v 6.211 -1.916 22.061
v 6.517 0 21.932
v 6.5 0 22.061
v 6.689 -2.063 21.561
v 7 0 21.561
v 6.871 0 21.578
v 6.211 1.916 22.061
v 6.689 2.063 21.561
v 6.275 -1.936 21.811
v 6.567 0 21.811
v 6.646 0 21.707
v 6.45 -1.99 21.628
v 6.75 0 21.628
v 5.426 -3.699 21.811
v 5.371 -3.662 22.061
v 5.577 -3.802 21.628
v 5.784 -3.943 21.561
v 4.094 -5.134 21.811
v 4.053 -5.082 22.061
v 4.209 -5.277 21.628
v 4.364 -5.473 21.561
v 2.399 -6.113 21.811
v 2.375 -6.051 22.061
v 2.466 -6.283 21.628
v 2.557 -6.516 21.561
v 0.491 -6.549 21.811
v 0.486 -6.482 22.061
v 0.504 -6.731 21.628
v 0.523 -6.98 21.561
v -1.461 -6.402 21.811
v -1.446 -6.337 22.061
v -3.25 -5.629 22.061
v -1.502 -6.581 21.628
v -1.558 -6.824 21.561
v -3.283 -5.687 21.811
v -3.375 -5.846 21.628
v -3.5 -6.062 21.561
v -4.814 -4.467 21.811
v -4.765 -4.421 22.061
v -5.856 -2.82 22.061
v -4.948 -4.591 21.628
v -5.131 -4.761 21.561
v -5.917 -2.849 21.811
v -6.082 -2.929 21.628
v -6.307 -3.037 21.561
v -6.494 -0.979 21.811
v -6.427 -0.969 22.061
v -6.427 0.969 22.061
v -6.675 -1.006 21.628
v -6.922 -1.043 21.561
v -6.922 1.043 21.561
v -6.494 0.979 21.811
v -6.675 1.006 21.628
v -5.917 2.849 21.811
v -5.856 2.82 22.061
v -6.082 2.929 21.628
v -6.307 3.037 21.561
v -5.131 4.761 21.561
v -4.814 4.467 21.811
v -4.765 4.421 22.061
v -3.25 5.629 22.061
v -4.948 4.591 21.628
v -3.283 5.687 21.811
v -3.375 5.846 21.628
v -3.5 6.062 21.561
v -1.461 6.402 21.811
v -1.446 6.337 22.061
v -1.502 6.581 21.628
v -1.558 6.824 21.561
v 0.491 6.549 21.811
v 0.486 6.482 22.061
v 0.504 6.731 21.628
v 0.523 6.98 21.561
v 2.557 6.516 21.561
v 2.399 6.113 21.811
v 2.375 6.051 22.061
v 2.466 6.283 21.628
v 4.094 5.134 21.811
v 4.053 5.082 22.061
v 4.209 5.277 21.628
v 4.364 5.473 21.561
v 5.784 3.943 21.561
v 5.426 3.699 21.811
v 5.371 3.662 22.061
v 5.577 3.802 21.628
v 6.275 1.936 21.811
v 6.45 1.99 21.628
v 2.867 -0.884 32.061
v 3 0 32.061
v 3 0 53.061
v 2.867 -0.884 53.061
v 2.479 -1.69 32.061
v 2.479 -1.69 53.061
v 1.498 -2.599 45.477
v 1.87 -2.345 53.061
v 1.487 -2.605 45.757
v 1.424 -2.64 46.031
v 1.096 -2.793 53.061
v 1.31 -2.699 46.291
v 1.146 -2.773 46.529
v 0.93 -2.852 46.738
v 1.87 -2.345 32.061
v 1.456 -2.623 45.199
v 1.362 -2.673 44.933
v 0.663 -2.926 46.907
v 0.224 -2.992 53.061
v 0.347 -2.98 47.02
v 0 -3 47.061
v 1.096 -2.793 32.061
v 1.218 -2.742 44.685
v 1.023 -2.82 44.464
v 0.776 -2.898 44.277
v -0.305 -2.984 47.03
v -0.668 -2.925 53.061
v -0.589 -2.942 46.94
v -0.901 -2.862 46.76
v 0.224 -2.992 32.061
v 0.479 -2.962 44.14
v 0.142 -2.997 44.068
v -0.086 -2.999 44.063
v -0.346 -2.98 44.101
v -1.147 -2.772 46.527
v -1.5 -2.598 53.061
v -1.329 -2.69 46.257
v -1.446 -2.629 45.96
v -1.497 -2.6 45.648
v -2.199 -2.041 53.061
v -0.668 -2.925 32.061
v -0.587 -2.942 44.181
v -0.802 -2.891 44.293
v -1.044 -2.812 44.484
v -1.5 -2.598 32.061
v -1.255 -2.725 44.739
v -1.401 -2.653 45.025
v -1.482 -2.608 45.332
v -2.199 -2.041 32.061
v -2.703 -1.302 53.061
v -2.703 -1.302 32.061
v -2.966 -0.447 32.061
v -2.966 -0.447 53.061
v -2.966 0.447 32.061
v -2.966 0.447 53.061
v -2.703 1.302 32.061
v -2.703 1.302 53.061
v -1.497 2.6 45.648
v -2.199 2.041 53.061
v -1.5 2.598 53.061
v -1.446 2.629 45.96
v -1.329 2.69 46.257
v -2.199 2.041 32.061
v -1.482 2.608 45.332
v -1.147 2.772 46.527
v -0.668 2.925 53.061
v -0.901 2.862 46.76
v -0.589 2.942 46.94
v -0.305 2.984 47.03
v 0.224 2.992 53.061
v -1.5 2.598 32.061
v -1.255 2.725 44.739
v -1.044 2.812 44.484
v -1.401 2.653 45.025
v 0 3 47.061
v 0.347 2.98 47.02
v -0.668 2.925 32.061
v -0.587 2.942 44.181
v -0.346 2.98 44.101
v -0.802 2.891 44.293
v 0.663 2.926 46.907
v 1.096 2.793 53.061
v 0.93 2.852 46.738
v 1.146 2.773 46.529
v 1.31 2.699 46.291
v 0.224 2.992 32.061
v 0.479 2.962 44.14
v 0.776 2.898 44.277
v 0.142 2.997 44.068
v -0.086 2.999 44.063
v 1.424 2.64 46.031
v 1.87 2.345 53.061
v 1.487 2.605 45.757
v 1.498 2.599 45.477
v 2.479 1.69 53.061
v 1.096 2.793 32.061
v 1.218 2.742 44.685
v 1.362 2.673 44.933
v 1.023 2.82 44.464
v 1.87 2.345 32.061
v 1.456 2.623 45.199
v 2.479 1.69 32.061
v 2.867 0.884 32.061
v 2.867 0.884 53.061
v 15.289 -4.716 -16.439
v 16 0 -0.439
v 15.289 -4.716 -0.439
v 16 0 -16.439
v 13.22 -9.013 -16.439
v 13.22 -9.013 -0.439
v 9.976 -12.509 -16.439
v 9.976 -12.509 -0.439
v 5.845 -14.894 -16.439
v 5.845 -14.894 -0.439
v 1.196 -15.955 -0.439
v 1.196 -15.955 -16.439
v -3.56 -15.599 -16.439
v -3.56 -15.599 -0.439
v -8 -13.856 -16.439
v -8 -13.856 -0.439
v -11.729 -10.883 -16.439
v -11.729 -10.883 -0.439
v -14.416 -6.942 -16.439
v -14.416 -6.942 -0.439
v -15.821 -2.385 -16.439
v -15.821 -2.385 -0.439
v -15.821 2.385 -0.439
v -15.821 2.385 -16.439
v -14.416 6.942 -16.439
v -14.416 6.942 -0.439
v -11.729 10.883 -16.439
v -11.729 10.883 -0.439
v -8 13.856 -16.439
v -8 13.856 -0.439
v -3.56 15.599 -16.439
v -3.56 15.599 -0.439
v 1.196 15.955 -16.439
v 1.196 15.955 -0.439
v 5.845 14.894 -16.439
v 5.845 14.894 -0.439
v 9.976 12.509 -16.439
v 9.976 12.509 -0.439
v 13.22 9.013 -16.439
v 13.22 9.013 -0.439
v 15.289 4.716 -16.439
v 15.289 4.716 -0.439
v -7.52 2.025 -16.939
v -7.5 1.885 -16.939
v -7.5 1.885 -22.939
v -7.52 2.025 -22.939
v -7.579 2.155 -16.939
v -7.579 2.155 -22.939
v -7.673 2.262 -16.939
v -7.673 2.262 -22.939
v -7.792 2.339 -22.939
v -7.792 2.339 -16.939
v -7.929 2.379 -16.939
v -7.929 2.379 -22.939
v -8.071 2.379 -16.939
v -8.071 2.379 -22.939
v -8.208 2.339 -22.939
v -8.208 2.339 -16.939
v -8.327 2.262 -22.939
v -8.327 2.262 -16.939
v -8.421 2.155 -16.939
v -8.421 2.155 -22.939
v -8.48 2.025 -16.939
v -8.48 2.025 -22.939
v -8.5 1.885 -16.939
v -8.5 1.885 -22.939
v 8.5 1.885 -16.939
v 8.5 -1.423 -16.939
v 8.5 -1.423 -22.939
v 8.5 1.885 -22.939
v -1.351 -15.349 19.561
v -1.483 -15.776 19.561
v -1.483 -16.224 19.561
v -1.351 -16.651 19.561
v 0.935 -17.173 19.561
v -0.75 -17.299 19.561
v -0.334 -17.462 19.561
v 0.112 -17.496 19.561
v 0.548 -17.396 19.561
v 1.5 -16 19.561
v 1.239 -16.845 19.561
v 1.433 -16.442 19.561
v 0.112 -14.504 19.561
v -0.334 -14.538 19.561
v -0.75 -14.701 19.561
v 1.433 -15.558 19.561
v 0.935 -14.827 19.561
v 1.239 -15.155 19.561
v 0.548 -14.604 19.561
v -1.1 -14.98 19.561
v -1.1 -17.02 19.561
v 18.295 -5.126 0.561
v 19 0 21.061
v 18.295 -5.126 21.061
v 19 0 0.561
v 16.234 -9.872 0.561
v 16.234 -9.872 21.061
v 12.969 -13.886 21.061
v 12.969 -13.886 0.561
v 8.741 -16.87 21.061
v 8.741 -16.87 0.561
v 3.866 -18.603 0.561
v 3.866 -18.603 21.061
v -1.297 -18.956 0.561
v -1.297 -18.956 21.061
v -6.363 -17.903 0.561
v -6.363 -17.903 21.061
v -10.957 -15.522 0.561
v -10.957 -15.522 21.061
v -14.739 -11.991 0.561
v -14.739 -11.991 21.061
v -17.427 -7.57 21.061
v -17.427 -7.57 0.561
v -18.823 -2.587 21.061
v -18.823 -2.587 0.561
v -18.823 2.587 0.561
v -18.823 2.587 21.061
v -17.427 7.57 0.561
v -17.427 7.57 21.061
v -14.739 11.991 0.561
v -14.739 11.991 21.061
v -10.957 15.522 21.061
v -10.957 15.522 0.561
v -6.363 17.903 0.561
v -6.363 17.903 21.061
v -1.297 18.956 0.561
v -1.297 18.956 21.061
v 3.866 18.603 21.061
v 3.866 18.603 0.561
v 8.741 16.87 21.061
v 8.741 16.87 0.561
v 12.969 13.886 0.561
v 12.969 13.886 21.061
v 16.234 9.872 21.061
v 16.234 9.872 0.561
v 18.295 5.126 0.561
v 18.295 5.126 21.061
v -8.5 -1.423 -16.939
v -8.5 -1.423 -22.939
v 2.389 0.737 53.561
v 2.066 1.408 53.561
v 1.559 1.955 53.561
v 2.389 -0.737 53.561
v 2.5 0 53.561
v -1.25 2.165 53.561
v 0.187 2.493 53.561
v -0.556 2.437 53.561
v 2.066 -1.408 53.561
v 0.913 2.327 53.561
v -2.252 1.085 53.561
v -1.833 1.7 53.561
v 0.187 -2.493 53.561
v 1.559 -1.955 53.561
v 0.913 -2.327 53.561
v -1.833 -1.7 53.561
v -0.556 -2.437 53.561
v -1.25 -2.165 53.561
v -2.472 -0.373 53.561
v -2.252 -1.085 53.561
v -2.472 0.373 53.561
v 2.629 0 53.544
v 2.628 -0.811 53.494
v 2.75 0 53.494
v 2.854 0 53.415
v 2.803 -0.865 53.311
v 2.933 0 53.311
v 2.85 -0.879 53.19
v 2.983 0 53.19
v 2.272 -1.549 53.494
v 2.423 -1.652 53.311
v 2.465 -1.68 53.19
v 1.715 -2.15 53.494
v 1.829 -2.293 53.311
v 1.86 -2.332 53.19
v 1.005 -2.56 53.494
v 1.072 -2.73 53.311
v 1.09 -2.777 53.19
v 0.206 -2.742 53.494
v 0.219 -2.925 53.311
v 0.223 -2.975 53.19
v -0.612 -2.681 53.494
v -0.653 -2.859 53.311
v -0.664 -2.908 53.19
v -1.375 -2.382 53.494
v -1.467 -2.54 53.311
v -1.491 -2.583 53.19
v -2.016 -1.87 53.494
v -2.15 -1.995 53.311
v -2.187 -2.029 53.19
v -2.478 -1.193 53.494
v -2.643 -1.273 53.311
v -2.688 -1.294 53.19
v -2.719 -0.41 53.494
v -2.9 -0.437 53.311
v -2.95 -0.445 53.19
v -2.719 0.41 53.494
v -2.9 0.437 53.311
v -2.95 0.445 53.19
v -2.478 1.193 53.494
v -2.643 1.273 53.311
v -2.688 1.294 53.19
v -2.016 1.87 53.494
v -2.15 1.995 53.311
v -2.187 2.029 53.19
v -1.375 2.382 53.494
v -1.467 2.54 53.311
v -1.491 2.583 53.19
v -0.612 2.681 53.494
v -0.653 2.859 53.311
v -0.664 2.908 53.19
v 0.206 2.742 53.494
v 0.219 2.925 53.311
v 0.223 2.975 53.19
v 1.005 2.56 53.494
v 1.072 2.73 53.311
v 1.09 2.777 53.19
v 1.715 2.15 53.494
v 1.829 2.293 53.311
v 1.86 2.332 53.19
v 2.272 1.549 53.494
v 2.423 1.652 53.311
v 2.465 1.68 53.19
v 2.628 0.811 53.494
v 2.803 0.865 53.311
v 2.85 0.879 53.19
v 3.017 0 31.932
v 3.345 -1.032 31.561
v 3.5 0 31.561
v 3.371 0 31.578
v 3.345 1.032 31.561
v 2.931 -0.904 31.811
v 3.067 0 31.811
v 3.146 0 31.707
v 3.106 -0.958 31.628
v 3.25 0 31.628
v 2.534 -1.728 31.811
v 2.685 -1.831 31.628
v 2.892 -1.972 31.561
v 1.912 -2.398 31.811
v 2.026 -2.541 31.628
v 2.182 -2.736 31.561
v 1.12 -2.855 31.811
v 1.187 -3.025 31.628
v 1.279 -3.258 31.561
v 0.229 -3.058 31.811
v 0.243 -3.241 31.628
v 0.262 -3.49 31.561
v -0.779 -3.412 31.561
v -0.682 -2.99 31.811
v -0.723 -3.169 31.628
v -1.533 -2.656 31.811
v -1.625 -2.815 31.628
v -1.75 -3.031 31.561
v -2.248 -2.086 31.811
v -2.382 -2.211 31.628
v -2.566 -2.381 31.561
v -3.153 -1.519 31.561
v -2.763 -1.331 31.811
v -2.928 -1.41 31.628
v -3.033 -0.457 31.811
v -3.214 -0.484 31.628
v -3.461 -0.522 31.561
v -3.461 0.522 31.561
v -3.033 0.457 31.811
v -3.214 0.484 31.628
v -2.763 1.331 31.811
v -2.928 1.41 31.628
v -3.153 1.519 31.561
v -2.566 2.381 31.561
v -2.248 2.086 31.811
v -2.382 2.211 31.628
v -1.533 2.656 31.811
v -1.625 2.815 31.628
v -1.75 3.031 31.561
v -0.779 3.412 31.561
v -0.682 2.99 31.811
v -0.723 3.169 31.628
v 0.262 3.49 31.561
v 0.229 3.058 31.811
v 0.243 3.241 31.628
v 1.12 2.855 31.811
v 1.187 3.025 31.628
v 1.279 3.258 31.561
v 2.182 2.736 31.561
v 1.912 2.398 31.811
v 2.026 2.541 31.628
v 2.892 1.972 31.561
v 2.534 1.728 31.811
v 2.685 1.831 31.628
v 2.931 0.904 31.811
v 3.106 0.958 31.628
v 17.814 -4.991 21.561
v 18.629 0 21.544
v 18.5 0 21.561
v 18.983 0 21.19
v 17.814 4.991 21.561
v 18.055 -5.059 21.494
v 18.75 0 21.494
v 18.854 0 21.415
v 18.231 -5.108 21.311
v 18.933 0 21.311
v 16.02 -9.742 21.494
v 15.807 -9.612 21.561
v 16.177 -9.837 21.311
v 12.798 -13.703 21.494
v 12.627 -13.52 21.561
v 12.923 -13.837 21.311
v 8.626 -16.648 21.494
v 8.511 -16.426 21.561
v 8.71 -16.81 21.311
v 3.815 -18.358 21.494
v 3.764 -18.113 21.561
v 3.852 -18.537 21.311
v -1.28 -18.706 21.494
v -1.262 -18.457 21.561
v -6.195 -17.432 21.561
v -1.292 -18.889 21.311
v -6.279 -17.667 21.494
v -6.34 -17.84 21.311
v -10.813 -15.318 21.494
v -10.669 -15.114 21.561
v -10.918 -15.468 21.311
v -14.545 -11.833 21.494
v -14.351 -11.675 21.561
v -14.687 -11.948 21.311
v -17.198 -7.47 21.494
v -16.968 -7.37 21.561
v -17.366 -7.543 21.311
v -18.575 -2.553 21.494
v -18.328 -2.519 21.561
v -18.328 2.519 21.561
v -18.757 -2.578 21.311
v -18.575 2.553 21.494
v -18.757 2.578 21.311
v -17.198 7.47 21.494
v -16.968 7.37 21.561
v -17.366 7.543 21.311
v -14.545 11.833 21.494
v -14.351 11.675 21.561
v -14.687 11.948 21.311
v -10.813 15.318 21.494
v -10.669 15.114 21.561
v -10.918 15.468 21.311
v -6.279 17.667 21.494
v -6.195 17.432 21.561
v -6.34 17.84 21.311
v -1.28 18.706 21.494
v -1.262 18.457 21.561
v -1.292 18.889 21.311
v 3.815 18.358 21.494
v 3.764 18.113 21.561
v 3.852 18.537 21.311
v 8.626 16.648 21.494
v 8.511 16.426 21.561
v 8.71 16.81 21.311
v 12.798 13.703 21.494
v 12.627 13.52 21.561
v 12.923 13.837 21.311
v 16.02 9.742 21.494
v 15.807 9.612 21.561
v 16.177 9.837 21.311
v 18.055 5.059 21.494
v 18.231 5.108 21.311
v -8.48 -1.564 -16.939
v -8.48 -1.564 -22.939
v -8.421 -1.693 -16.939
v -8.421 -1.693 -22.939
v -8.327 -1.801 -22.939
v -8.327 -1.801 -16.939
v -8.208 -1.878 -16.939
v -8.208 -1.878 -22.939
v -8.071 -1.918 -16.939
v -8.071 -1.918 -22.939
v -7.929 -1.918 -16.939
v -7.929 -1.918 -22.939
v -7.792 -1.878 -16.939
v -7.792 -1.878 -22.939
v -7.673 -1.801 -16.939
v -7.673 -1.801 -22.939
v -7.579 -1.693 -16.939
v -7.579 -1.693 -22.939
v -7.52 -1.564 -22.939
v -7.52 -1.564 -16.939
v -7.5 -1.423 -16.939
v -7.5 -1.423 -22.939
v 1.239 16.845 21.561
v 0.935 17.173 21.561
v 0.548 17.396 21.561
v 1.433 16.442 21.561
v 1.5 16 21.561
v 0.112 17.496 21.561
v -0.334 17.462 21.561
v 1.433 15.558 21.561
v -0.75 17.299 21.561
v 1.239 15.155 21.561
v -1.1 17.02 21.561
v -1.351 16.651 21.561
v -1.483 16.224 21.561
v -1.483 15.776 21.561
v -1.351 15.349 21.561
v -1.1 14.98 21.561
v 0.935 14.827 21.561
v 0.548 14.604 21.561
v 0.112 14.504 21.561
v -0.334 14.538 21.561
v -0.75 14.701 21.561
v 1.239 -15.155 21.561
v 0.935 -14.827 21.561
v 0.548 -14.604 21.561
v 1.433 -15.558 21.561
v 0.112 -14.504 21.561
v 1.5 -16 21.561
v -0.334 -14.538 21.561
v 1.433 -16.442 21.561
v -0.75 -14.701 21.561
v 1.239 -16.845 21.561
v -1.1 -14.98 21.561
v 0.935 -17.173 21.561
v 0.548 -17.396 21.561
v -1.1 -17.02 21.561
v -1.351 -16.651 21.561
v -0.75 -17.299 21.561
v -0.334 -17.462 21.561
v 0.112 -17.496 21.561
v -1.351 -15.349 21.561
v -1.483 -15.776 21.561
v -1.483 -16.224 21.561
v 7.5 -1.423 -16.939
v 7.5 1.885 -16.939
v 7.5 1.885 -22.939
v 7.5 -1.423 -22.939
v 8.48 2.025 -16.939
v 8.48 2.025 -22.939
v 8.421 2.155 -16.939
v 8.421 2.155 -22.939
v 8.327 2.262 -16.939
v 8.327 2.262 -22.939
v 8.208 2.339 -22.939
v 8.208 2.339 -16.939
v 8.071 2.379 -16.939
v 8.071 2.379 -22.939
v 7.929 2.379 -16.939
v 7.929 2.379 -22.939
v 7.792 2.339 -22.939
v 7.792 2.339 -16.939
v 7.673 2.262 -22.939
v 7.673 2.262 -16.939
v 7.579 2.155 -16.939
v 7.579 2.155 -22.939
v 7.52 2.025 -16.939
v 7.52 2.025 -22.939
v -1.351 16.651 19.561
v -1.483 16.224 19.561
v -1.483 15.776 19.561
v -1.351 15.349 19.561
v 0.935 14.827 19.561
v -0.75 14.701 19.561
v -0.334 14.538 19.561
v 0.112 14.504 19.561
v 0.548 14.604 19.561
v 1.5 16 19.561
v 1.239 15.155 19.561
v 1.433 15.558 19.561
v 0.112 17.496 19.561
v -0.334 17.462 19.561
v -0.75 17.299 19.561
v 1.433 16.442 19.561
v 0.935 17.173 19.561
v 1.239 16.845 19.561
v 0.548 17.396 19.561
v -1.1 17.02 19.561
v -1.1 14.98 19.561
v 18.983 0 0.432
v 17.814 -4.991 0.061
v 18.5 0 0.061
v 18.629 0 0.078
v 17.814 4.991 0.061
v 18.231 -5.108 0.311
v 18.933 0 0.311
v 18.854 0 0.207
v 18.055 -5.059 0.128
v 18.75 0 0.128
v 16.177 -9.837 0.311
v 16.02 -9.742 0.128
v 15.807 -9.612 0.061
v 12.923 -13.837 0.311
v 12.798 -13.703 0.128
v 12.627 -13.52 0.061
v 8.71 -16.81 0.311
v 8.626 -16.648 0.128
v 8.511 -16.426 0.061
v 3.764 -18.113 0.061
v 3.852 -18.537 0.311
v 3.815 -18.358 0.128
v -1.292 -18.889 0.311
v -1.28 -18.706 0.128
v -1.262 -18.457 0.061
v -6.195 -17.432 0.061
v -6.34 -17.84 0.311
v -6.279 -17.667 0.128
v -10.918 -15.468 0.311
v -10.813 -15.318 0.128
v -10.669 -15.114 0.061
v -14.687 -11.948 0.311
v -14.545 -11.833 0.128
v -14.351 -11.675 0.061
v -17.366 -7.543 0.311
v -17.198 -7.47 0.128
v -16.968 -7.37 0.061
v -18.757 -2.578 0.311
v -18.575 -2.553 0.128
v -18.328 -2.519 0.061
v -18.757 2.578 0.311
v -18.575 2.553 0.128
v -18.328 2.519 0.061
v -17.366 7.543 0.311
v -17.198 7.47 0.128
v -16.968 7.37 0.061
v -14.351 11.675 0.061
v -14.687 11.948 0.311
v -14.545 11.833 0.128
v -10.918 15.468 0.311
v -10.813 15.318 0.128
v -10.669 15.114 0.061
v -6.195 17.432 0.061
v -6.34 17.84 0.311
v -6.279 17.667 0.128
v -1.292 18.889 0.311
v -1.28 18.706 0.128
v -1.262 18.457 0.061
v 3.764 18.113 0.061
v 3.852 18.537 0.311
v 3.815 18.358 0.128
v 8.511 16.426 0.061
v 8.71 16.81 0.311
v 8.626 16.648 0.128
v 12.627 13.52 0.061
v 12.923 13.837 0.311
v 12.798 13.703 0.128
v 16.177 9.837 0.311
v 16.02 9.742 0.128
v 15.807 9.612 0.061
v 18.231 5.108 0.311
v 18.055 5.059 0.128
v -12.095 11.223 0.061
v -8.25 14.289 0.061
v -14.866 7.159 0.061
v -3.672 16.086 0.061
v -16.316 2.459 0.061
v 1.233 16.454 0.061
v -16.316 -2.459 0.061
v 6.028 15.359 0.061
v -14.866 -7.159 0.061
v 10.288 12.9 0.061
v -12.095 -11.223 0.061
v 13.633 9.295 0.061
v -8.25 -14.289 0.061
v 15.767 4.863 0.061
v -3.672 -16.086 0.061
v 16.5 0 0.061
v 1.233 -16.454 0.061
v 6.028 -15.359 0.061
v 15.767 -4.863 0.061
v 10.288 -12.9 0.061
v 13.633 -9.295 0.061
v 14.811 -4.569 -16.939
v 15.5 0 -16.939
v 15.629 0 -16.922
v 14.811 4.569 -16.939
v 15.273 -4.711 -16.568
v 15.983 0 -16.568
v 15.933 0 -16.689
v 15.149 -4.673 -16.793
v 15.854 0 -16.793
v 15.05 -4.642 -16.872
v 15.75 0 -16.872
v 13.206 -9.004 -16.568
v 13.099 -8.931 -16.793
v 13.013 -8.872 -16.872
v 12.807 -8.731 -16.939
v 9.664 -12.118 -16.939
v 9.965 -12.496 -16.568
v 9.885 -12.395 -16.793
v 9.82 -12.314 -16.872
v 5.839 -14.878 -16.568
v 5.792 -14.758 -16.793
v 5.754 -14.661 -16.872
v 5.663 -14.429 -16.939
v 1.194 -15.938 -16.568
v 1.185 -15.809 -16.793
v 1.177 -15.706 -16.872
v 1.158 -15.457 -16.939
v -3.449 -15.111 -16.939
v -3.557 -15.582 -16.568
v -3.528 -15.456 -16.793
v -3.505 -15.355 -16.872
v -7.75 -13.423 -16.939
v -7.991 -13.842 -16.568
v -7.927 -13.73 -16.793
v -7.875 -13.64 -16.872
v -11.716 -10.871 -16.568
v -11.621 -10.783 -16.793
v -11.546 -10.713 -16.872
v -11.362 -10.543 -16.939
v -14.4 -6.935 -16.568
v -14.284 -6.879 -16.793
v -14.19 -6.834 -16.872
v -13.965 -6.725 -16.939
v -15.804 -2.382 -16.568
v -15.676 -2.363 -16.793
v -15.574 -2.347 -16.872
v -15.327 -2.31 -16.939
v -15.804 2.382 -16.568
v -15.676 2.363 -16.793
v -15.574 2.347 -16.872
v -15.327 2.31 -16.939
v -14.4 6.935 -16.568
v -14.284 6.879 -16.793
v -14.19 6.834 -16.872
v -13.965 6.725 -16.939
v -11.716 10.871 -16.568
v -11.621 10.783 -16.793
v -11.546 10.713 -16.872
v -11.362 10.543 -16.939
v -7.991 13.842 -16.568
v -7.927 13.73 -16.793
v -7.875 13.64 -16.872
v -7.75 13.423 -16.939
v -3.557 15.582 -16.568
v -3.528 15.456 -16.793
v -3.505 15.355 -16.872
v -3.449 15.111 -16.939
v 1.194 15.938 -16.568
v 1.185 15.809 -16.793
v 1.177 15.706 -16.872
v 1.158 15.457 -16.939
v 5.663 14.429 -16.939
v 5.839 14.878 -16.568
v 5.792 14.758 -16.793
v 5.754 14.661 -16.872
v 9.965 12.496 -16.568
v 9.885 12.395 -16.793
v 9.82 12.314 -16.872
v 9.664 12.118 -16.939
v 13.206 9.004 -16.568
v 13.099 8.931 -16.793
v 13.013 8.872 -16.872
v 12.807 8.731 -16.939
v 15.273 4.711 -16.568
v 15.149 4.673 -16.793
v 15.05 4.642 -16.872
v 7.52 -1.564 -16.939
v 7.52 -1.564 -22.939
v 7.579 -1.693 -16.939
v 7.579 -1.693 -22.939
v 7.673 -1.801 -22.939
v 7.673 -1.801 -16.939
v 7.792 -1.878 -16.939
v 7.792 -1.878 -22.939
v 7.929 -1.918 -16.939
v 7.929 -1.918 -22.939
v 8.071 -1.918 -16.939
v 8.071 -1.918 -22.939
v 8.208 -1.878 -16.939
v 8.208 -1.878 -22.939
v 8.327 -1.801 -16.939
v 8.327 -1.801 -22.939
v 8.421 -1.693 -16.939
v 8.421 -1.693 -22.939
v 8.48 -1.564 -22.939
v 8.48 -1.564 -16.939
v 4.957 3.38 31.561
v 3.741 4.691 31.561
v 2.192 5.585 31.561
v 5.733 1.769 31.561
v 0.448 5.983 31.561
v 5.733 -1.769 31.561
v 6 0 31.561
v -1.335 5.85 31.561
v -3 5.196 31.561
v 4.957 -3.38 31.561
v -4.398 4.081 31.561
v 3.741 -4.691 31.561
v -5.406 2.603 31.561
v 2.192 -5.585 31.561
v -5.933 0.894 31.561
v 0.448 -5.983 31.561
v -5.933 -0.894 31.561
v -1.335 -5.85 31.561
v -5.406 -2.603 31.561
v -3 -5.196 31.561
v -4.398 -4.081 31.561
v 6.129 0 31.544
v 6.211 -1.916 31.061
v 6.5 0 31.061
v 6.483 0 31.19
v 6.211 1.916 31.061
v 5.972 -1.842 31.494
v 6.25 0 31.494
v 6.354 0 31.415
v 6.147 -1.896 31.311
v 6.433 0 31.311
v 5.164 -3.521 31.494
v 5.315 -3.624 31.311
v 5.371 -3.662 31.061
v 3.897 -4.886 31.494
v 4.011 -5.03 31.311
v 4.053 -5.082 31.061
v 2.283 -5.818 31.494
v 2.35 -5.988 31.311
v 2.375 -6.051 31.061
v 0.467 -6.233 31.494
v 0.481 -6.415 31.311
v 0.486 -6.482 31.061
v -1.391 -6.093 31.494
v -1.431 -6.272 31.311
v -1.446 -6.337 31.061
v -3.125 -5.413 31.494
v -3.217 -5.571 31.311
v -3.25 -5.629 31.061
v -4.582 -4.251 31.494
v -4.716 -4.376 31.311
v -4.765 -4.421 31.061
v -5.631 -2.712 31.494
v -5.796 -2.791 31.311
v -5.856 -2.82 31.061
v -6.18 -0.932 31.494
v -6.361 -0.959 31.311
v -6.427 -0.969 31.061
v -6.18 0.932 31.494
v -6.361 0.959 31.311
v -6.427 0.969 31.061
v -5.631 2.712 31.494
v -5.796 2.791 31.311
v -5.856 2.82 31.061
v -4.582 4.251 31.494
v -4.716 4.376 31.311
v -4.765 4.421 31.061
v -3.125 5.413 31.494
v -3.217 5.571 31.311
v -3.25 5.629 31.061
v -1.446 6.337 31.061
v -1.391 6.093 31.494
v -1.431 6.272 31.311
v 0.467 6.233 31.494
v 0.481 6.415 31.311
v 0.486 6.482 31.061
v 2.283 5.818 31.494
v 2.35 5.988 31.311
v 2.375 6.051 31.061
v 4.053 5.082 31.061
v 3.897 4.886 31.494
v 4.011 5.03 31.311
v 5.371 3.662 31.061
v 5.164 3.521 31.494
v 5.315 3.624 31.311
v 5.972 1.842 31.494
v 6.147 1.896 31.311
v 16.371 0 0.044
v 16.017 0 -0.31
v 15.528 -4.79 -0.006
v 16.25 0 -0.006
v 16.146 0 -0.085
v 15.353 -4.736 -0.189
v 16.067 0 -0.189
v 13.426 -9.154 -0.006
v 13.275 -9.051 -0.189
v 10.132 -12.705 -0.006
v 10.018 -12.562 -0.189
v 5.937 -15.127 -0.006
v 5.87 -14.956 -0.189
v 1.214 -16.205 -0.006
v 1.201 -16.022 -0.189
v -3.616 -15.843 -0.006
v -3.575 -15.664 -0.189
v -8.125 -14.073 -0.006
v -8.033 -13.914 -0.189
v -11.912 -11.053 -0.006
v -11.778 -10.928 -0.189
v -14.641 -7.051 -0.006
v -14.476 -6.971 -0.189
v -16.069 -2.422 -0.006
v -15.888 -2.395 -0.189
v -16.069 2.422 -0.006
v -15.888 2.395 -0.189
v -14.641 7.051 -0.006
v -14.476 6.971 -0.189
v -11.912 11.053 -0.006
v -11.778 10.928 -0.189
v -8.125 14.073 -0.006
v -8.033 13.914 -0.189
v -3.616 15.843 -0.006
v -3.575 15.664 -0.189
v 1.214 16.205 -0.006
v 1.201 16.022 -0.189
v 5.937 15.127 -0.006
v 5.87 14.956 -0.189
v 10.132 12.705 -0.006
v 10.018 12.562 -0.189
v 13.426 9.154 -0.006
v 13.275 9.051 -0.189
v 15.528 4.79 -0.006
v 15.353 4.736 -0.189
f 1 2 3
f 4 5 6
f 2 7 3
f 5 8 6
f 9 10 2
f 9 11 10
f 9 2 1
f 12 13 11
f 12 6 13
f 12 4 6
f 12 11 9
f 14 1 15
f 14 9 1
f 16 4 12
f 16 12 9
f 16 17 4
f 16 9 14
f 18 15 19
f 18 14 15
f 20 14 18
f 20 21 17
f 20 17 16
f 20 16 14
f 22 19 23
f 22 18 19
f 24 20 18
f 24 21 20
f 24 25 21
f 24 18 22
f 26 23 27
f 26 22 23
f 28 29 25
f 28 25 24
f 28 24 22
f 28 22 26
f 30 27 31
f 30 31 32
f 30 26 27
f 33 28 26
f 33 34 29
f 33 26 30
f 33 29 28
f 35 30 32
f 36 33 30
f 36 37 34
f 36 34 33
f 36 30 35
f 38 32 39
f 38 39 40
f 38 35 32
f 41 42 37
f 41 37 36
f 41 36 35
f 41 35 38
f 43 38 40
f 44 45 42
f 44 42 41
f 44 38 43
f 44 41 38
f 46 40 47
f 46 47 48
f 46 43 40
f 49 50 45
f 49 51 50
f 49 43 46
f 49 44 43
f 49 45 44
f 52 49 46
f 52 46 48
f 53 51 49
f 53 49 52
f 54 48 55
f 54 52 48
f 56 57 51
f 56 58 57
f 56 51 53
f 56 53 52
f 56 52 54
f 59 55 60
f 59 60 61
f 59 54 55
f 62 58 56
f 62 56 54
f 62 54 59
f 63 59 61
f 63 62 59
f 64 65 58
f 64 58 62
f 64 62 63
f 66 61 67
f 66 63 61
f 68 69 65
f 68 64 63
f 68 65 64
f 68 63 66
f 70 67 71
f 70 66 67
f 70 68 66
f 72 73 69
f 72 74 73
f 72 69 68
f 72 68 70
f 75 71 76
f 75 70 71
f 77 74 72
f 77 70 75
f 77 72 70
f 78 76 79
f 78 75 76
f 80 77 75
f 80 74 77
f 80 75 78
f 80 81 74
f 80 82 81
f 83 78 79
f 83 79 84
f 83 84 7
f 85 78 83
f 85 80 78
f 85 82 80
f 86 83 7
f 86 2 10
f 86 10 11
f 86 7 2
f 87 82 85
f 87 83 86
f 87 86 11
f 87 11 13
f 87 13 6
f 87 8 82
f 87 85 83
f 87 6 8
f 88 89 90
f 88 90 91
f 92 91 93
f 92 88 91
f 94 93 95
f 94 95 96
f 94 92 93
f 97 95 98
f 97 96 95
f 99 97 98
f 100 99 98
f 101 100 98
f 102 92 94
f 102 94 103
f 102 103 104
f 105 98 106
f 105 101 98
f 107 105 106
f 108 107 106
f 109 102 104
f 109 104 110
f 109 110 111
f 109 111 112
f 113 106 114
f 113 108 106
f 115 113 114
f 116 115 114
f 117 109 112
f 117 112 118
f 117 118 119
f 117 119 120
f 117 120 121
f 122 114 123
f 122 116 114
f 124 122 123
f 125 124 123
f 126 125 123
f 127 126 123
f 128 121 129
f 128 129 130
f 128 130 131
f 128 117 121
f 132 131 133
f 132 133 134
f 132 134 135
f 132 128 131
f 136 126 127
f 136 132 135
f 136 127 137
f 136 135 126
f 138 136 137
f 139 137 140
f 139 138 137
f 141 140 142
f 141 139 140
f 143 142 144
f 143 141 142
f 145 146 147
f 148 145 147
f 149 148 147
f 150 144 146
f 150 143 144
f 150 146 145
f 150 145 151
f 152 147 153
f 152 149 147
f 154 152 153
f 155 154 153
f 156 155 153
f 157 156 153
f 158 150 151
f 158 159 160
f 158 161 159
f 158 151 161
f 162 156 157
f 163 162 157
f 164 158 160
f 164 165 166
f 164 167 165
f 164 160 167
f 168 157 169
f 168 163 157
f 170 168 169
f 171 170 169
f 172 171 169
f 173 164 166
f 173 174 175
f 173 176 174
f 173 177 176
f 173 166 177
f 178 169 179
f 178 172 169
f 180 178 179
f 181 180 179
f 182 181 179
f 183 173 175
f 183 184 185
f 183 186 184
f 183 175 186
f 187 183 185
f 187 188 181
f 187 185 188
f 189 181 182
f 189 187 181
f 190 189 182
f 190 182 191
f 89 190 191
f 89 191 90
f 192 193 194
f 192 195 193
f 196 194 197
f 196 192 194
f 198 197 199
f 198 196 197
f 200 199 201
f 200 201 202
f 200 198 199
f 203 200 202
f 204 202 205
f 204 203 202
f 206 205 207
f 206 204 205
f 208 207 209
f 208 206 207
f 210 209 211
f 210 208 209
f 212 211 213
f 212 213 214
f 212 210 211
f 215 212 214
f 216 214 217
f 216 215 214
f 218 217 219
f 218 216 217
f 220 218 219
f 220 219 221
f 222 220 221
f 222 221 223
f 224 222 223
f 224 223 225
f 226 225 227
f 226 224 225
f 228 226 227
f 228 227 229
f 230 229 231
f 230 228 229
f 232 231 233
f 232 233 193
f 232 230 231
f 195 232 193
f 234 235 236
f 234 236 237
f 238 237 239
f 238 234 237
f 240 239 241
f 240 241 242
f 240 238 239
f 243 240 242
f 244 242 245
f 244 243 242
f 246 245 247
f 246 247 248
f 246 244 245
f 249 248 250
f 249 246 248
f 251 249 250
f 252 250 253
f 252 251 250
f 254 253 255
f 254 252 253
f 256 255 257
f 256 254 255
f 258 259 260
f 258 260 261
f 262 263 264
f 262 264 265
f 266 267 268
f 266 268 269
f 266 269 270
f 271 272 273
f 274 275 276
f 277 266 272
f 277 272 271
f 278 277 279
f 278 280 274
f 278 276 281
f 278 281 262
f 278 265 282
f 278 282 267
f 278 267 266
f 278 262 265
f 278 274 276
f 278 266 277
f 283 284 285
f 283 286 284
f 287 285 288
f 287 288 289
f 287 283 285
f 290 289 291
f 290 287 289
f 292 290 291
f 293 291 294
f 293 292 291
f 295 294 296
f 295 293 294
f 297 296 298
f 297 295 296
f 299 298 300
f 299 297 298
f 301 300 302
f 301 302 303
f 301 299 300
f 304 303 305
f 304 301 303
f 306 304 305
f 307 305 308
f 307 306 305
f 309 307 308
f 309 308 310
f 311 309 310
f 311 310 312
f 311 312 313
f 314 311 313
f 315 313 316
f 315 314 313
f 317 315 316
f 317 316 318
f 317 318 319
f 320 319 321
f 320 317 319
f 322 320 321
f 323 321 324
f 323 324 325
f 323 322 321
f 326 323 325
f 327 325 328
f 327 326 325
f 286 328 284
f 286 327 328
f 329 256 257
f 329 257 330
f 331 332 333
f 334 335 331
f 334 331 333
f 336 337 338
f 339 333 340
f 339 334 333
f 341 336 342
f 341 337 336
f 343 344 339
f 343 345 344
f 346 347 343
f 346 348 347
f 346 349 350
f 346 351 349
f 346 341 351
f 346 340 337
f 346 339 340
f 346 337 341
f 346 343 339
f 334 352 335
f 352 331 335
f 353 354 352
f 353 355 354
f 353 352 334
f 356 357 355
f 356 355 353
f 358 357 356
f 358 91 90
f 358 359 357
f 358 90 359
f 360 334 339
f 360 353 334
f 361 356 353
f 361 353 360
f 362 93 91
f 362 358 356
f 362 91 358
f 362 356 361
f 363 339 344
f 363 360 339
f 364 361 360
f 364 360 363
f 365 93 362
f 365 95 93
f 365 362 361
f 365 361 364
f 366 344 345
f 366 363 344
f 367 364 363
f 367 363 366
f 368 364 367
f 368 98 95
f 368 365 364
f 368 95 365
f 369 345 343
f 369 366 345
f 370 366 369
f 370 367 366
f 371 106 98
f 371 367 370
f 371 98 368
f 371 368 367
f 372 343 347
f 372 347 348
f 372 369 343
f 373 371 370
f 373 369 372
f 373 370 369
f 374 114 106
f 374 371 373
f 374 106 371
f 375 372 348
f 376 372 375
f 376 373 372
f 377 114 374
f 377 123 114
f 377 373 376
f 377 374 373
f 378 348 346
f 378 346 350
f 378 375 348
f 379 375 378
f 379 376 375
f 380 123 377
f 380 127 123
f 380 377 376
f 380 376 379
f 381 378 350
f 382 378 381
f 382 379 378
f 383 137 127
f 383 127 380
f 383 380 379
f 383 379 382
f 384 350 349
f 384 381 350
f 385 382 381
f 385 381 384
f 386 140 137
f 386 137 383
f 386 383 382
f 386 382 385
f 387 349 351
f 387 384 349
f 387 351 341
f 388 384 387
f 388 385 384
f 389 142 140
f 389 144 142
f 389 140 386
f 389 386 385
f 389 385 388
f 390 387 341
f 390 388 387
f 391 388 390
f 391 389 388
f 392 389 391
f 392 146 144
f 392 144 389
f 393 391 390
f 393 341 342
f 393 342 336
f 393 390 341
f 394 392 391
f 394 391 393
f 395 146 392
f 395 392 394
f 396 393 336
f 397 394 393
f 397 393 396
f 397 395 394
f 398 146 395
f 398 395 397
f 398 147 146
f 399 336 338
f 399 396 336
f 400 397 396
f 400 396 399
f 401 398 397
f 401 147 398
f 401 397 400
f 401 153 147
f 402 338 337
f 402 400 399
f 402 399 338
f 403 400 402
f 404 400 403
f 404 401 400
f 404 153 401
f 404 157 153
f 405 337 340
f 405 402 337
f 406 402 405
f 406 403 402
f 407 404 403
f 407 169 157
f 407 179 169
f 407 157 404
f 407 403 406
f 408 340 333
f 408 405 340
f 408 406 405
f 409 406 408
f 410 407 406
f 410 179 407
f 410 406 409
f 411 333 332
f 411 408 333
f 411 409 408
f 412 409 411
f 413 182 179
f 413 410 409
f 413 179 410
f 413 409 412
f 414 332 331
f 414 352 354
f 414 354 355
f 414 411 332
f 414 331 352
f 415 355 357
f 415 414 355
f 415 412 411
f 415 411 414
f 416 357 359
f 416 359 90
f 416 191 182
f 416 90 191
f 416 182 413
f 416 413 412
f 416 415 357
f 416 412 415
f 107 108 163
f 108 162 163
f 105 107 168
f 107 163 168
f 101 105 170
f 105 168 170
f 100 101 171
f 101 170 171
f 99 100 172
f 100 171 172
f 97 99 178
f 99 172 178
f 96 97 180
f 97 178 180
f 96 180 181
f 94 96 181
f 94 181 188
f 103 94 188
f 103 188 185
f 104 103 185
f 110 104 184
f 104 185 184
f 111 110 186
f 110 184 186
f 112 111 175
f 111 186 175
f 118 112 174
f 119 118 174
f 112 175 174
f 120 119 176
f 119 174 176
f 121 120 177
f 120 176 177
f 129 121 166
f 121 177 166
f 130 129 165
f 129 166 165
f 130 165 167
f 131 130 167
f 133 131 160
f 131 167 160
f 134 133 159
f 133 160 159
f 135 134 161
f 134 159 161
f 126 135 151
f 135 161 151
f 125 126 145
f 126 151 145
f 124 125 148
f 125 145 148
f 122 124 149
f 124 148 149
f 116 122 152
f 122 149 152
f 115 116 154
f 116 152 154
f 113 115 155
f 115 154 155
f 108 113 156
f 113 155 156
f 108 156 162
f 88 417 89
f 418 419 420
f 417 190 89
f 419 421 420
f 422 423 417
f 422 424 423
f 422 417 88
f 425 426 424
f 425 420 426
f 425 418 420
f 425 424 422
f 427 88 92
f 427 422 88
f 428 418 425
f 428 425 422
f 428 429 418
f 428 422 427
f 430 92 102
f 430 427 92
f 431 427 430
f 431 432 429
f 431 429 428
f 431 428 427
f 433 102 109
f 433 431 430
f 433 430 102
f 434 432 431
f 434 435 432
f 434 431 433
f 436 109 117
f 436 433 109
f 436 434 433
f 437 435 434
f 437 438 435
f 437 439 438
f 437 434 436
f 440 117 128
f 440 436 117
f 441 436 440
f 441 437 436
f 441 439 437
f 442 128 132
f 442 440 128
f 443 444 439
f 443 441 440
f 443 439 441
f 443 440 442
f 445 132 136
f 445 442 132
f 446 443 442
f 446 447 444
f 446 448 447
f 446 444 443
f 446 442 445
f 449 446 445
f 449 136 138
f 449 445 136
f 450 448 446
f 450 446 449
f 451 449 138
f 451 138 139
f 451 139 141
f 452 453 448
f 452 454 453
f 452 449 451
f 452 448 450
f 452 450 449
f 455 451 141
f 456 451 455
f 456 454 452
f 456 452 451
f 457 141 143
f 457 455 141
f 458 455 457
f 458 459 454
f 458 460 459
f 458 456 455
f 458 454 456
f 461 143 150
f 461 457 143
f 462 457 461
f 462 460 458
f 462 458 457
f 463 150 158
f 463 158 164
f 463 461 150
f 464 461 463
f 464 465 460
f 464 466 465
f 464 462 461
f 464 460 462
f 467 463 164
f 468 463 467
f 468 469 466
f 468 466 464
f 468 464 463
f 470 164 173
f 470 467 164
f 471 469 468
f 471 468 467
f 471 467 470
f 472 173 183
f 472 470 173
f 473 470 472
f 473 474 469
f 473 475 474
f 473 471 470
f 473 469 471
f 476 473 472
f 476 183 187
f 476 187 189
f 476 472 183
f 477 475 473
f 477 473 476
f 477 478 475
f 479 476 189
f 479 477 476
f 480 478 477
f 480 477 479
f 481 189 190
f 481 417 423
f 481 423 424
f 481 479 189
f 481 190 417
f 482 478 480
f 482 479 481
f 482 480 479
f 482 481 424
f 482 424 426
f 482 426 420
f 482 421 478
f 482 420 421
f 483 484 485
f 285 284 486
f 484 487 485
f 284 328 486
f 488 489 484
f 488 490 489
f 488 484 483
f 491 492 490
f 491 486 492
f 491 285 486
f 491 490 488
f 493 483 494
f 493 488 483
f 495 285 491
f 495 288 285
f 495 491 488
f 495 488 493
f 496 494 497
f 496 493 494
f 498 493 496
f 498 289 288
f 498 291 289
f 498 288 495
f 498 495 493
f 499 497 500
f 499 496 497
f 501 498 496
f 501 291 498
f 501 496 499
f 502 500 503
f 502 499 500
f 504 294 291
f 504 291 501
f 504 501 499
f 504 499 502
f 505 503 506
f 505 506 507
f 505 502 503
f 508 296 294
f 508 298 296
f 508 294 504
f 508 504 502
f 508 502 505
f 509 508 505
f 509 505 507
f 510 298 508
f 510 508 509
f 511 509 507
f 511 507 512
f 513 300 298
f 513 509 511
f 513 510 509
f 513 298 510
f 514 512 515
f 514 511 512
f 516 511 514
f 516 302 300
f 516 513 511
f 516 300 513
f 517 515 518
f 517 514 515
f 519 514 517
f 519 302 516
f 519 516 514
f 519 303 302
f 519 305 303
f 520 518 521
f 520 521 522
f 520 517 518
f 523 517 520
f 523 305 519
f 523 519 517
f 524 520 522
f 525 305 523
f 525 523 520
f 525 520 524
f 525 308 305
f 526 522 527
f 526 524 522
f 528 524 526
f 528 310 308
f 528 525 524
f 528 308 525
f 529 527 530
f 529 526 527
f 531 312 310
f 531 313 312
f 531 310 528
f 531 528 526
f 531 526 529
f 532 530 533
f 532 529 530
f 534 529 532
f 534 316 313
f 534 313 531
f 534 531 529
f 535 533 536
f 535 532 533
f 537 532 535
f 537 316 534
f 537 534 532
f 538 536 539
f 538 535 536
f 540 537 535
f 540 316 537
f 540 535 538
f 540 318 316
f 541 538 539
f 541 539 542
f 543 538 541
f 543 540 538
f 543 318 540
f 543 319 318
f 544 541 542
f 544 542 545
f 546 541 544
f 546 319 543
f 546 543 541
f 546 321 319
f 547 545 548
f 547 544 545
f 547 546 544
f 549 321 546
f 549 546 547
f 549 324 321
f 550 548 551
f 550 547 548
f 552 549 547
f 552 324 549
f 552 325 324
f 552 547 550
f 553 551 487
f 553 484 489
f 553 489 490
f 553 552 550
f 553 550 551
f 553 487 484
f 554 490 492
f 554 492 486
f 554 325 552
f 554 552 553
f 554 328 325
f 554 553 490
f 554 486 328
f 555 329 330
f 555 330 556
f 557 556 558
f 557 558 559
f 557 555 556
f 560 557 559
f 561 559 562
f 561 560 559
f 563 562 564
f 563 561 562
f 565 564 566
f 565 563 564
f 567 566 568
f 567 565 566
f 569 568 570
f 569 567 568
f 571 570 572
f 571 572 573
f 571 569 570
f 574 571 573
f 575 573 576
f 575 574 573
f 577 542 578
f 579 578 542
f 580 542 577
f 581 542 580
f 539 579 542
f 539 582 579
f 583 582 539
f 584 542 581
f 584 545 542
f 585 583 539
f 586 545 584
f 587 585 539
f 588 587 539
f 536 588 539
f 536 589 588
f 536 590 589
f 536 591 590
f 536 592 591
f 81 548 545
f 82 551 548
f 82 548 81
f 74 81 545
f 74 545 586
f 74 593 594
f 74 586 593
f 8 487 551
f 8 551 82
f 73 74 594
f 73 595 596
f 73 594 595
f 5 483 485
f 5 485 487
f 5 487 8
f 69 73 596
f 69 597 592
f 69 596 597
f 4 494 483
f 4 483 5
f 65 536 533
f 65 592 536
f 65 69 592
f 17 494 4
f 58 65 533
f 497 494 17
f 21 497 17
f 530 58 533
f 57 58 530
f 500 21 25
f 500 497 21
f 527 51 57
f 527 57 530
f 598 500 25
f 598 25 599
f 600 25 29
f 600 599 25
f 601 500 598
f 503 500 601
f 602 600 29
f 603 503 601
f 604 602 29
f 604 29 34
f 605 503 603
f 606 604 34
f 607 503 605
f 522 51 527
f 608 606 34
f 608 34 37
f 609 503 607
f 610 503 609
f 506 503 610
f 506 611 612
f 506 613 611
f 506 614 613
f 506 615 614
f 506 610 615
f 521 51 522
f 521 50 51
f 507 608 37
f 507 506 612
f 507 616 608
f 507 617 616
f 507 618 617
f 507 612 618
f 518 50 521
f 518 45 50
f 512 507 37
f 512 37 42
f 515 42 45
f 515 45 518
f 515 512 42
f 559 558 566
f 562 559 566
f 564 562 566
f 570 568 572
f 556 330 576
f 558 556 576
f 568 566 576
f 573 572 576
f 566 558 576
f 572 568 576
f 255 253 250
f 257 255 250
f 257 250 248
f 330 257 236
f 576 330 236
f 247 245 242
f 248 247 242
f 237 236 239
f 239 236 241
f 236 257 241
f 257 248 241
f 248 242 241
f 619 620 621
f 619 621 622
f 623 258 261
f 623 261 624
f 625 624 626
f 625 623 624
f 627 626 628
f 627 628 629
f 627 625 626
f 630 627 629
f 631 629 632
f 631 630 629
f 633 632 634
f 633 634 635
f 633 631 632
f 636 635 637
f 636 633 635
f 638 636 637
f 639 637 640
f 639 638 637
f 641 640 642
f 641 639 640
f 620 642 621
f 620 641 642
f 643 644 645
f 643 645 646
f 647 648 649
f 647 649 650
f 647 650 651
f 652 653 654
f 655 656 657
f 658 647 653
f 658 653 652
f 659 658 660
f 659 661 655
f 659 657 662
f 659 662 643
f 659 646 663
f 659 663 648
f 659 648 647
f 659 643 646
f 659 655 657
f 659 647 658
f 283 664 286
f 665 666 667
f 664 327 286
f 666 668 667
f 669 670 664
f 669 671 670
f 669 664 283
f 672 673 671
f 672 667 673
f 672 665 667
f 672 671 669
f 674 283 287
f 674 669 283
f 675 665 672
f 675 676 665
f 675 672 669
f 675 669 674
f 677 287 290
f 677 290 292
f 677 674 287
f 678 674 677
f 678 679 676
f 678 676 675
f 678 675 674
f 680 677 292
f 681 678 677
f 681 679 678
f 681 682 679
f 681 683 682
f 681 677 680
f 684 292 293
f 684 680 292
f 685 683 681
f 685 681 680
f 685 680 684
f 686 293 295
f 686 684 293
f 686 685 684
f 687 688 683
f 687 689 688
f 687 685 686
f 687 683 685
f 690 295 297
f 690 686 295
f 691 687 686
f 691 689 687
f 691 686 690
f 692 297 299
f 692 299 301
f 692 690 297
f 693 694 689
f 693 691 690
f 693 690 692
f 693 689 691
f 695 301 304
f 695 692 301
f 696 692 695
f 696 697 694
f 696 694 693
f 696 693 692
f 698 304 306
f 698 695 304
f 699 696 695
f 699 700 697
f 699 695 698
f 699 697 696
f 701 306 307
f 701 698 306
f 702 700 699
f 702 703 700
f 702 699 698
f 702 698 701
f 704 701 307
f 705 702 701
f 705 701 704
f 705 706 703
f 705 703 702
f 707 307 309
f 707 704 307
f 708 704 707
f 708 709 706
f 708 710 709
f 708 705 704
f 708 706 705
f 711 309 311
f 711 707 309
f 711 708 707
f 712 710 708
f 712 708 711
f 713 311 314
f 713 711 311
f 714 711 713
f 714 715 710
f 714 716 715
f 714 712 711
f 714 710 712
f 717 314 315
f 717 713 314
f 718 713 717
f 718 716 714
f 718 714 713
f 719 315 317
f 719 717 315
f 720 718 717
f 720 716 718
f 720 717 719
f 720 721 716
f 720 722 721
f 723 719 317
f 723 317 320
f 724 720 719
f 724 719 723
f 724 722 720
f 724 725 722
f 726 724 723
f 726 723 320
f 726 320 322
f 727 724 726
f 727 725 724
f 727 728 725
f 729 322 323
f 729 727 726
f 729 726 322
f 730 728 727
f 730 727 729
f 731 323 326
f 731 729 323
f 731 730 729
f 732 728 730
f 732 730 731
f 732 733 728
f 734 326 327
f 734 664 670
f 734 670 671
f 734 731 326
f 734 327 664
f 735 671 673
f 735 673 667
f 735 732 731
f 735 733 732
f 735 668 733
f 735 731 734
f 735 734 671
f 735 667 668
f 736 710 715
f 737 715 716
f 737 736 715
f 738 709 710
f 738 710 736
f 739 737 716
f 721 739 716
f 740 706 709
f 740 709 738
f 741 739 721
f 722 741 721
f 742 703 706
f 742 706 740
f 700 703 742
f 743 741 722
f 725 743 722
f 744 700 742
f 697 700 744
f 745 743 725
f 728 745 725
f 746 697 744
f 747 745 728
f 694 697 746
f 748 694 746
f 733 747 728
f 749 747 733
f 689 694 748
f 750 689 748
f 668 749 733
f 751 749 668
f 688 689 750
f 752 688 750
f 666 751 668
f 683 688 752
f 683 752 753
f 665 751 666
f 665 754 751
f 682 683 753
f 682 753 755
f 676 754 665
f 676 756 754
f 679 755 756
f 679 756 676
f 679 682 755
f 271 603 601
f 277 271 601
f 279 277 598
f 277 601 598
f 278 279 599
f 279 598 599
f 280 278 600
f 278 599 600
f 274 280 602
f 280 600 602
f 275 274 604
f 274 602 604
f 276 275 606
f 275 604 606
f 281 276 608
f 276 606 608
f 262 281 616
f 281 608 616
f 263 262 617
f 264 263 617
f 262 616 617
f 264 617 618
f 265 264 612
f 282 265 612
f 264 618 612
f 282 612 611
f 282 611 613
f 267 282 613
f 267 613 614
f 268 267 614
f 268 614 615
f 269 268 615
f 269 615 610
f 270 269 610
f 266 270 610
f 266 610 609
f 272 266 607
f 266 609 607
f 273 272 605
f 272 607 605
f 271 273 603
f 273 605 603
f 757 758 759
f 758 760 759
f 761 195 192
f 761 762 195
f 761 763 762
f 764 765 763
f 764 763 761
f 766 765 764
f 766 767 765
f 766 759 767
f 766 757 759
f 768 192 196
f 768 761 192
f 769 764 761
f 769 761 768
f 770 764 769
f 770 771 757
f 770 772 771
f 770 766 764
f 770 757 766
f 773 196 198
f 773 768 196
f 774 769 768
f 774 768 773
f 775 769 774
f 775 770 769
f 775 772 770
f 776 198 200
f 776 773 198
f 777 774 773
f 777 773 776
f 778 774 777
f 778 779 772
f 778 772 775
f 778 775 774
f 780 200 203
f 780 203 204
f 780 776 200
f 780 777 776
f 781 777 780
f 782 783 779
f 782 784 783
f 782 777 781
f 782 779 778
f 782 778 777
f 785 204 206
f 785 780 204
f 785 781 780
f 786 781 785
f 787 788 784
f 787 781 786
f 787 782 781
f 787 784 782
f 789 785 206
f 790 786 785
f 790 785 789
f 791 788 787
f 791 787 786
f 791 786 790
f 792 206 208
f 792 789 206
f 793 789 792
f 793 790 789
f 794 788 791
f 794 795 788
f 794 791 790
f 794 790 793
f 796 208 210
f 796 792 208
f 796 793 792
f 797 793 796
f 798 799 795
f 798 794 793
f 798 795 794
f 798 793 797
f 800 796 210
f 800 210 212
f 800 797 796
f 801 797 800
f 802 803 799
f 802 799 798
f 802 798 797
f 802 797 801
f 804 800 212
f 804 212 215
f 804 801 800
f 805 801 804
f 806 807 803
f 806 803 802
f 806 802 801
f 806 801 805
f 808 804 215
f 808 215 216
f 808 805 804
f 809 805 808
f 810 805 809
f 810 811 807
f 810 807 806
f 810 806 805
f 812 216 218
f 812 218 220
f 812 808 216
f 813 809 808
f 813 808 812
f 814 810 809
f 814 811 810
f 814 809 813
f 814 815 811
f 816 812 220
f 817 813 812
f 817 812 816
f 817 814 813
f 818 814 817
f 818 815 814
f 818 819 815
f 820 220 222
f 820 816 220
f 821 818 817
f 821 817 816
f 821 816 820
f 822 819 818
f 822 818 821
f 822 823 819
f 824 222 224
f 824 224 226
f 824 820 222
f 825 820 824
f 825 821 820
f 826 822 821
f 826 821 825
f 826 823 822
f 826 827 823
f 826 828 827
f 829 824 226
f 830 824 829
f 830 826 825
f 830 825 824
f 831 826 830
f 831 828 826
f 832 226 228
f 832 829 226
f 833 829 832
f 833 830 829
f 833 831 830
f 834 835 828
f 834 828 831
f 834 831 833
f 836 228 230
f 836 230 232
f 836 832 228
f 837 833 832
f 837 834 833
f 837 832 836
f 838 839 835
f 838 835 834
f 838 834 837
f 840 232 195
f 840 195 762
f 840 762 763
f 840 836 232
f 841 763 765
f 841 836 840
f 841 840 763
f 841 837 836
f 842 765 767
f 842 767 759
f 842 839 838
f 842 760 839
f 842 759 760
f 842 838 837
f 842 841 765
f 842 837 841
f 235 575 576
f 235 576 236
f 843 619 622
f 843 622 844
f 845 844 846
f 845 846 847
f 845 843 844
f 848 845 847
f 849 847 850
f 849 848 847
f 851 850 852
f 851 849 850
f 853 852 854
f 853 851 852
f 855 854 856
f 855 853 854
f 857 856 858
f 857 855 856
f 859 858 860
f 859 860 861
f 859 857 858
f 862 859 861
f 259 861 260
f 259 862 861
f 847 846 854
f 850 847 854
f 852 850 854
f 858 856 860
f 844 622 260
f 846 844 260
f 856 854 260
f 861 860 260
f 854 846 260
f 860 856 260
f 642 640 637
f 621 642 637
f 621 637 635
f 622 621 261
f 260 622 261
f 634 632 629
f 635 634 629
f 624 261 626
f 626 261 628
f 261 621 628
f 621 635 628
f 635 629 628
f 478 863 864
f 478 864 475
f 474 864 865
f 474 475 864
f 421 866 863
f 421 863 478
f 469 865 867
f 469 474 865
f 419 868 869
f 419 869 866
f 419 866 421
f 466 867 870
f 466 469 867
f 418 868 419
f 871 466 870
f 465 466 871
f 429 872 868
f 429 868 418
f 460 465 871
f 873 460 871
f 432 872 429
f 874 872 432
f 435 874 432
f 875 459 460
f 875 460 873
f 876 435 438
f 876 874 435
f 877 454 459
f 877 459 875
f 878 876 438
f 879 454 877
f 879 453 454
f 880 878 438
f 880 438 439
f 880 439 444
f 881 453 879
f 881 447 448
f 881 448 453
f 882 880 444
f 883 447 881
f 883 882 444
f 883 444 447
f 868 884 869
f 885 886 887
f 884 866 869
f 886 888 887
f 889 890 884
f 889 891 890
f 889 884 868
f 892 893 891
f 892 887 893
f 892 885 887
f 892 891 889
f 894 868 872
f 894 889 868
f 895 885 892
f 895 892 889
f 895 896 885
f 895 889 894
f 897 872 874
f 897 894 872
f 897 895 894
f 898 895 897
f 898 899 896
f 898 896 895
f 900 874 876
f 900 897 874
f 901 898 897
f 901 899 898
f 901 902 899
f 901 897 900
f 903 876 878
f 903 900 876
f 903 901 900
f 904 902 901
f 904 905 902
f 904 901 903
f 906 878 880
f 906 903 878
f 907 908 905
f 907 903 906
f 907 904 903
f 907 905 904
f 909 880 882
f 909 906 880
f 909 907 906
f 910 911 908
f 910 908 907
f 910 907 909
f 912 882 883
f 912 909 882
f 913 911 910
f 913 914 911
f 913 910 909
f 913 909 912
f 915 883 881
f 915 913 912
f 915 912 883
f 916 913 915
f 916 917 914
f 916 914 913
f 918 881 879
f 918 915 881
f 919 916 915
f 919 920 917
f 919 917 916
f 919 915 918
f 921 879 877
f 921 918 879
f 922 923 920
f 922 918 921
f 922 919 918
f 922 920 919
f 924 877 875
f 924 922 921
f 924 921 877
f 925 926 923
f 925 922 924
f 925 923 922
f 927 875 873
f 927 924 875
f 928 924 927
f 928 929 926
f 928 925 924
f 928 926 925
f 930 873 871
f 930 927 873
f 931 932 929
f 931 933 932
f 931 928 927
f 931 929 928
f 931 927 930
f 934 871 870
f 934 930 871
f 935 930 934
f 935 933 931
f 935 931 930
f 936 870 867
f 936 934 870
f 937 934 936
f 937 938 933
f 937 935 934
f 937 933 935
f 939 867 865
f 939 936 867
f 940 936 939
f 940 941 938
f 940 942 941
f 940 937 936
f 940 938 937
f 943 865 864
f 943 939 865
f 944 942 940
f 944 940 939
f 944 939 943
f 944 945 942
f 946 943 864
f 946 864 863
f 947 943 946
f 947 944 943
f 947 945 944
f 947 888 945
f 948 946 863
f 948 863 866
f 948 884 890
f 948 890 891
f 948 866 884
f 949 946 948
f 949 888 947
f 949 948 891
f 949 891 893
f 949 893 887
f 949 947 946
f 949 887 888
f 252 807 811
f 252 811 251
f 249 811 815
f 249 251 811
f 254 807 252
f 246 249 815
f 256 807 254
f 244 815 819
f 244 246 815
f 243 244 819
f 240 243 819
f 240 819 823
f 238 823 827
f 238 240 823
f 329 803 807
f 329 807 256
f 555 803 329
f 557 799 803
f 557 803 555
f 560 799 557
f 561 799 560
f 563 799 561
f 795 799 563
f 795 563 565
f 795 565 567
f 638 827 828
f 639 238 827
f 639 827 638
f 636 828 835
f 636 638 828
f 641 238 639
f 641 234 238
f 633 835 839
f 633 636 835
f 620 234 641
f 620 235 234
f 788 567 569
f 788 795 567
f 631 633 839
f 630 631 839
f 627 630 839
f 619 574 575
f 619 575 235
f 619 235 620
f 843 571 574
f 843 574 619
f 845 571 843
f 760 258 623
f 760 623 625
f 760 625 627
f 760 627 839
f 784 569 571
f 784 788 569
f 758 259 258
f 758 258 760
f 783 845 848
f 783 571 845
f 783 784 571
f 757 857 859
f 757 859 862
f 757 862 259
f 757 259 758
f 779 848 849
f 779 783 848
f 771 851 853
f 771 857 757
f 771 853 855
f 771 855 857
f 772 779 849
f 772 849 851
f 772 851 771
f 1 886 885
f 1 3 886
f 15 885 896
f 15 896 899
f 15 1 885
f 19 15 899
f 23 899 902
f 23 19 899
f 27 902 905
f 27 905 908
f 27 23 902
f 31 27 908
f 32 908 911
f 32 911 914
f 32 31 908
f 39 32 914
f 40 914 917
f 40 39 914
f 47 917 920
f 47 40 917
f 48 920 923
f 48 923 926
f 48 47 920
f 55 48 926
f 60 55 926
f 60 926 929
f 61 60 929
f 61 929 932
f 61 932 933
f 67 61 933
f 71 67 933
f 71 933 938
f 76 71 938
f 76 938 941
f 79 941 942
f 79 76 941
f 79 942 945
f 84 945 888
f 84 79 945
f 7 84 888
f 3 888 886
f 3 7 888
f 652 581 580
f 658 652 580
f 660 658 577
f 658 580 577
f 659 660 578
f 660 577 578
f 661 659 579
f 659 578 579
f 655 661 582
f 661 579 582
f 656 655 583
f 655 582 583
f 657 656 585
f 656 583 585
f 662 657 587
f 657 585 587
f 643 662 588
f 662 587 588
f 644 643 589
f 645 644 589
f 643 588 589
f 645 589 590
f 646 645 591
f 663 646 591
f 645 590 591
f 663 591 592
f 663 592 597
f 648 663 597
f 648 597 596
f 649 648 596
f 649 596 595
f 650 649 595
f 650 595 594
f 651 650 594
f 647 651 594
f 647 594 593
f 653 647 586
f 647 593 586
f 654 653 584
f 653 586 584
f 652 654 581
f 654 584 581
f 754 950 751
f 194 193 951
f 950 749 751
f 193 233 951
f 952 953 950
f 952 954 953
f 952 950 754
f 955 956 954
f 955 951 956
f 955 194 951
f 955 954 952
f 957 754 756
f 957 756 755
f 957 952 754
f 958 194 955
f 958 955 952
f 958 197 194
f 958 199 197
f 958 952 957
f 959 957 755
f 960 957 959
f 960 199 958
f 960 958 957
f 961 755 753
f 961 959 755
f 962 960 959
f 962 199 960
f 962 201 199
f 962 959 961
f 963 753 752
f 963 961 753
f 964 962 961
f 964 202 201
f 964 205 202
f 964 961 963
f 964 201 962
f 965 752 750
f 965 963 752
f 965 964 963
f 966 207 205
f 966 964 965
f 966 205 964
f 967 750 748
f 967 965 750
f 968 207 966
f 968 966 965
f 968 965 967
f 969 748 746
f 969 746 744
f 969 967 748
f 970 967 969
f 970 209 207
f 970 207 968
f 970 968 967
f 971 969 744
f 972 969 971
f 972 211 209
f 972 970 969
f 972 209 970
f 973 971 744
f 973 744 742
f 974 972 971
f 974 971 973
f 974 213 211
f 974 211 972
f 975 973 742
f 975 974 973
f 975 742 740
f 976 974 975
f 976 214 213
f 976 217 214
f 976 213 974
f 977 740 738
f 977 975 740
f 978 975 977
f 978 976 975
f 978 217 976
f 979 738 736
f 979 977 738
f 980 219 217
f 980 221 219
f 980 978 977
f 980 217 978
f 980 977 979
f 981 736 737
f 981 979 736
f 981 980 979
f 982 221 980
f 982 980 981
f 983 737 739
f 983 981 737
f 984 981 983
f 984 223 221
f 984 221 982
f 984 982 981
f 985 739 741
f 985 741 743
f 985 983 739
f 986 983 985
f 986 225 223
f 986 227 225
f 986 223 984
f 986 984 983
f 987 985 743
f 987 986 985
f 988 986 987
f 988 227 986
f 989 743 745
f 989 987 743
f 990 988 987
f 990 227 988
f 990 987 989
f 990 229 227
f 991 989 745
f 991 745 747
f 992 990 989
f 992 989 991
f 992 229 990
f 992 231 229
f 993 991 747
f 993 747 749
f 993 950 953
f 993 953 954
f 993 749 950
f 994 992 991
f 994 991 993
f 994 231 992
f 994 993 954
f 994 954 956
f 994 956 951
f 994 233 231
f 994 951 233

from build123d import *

# Parameters (mm, degrees)
SKETCH3_R           = 1.5
CUT_EXTRUDE1_DEPTH  = 5
BOSS_EXTRUDE1_DEPTH = 6
SKETCH5_R           = 1.5
CUT_EXTRUDE2_DEPTH  = 2


with BuildPart() as part:
    # Sketch2 → Revolve1 (revolve)
    with BuildSketch(Plane(origin=(0, 0, 0), x_dir=(0, 0, -1), z_dir=(1, 0, 0)), mode=Mode.PRIVATE) as revolve1_sk:
        with BuildLine():
            Line((-53.56097561, 0), (-53.56097561, 2.5))
            ThreePointArc((-53.56097561, 2.5), (-53.414529, 2.853553391), (-53.06097561, 3))
            Line((-53.06097561, 3), (-32.06097561, 3))
            ThreePointArc((-32.06097561, 3), (-31.707422219, 3.146446609), (-31.56097561, 3.5))
            Line((-31.56097561, 3.5), (-31.56097561, 6))
            ThreePointArc((-31.56097561, 6), (-31.414529, 6.353553391), (-31.06097561, 6.5))
            Line((-31.06097561, 6.5), (-22.06097561, 6.5))
            ThreePointArc((-22.06097561, 6.5), (-21.707422219, 6.646446609), (-21.56097561, 7))
            Line((-21.56097561, 7), (-21.56097561, 18.5))
            ThreePointArc((-21.56097561, 18.5), (-21.414529, 18.853553391), (-21.06097561, 19))
            Line((-21.06097561, 19), (-0.56097561, 19))
            ThreePointArc((-0.56097561, 19), (-0.207422219, 18.853553391), (-0.06097561, 18.5))
            Line((-0.06097561, 18.5), (-0.06097561, 16.5))
            ThreePointArc((-0.06097561, 16.5), (0.085471, 16.146446609), (0.43902439, 16))
            Line((0.43902439, 16), (16.43902439, 16))
            ThreePointArc((16.43902439, 16), (16.792577781, 15.853553391), (16.93902439, 15.5))
            Line((16.93902439, 15.5), (16.93902439, 0))
            Line((16.93902439, 0), (-53.56097561, 0))
        make_face()
    revolve(revolve1_sk.sketch.rotate(Axis((0, 0, 60.146341463), (0, 0, -1)), 90), axis=Axis((0, 0, 60.146341463), (0, 0, -1)))

    # Sketch3 → Cut-Extrude1 (cut, symmetric)
    with BuildSketch(Plane(origin=(0, 0, 0), x_dir=(1, 0, 0), z_dir=(0, 1, 0))):
        with Locations(Location((0, -45.56097561, 0), (0, 0, 270))):
            Circle(SKETCH3_R)
    extrude(amount=CUT_EXTRUDE1_DEPTH, both=True, mode=Mode.SUBTRACT)

    # Sketch4 → Boss-Extrude1 (add)
    with BuildSketch(Plane(origin=(0, 0, -16.93902439), x_dir=(-1, 0, 0), z_dir=(0, 0, -1))):
        with BuildLine():
            Line((-7.5, 1.884578241), (-7.5, -1.423048876))
            ThreePointArc((-7.5, -1.423048876), (-8, -1.923048876), (-8.5, -1.423048876))
            Line((-8.5, -1.423048876), (-8.5, 1.884578241))
            ThreePointArc((-8.5, 1.884578241), (-8, 2.384578241), (-7.5, 1.884578241))
        make_face()
        with BuildLine():
            Line((8.5, 1.884578241), (8.5, -1.423048876))
            ThreePointArc((8.5, -1.423048876), (8, -1.923048876), (7.5, -1.423048876))
            Line((7.5, -1.423048876), (7.5, 1.884578241))
            ThreePointArc((7.5, 1.884578241), (8, 2.384578241), (8.5, 1.884578241))
        make_face()
    extrude(amount=BOSS_EXTRUDE1_DEPTH)

    # Sketch5 → Cut-Extrude2 (cut)
    with BuildSketch(Plane.XY.offset(21.56097561)):
        with Locations((0, 16)):
            Circle(SKETCH5_R)
        with Locations((0, -16)):
            Circle(SKETCH5_R)
    extrude(amount=-CUT_EXTRUDE2_DEPTH, mode=Mode.SUBTRACT)


solid = part.part
